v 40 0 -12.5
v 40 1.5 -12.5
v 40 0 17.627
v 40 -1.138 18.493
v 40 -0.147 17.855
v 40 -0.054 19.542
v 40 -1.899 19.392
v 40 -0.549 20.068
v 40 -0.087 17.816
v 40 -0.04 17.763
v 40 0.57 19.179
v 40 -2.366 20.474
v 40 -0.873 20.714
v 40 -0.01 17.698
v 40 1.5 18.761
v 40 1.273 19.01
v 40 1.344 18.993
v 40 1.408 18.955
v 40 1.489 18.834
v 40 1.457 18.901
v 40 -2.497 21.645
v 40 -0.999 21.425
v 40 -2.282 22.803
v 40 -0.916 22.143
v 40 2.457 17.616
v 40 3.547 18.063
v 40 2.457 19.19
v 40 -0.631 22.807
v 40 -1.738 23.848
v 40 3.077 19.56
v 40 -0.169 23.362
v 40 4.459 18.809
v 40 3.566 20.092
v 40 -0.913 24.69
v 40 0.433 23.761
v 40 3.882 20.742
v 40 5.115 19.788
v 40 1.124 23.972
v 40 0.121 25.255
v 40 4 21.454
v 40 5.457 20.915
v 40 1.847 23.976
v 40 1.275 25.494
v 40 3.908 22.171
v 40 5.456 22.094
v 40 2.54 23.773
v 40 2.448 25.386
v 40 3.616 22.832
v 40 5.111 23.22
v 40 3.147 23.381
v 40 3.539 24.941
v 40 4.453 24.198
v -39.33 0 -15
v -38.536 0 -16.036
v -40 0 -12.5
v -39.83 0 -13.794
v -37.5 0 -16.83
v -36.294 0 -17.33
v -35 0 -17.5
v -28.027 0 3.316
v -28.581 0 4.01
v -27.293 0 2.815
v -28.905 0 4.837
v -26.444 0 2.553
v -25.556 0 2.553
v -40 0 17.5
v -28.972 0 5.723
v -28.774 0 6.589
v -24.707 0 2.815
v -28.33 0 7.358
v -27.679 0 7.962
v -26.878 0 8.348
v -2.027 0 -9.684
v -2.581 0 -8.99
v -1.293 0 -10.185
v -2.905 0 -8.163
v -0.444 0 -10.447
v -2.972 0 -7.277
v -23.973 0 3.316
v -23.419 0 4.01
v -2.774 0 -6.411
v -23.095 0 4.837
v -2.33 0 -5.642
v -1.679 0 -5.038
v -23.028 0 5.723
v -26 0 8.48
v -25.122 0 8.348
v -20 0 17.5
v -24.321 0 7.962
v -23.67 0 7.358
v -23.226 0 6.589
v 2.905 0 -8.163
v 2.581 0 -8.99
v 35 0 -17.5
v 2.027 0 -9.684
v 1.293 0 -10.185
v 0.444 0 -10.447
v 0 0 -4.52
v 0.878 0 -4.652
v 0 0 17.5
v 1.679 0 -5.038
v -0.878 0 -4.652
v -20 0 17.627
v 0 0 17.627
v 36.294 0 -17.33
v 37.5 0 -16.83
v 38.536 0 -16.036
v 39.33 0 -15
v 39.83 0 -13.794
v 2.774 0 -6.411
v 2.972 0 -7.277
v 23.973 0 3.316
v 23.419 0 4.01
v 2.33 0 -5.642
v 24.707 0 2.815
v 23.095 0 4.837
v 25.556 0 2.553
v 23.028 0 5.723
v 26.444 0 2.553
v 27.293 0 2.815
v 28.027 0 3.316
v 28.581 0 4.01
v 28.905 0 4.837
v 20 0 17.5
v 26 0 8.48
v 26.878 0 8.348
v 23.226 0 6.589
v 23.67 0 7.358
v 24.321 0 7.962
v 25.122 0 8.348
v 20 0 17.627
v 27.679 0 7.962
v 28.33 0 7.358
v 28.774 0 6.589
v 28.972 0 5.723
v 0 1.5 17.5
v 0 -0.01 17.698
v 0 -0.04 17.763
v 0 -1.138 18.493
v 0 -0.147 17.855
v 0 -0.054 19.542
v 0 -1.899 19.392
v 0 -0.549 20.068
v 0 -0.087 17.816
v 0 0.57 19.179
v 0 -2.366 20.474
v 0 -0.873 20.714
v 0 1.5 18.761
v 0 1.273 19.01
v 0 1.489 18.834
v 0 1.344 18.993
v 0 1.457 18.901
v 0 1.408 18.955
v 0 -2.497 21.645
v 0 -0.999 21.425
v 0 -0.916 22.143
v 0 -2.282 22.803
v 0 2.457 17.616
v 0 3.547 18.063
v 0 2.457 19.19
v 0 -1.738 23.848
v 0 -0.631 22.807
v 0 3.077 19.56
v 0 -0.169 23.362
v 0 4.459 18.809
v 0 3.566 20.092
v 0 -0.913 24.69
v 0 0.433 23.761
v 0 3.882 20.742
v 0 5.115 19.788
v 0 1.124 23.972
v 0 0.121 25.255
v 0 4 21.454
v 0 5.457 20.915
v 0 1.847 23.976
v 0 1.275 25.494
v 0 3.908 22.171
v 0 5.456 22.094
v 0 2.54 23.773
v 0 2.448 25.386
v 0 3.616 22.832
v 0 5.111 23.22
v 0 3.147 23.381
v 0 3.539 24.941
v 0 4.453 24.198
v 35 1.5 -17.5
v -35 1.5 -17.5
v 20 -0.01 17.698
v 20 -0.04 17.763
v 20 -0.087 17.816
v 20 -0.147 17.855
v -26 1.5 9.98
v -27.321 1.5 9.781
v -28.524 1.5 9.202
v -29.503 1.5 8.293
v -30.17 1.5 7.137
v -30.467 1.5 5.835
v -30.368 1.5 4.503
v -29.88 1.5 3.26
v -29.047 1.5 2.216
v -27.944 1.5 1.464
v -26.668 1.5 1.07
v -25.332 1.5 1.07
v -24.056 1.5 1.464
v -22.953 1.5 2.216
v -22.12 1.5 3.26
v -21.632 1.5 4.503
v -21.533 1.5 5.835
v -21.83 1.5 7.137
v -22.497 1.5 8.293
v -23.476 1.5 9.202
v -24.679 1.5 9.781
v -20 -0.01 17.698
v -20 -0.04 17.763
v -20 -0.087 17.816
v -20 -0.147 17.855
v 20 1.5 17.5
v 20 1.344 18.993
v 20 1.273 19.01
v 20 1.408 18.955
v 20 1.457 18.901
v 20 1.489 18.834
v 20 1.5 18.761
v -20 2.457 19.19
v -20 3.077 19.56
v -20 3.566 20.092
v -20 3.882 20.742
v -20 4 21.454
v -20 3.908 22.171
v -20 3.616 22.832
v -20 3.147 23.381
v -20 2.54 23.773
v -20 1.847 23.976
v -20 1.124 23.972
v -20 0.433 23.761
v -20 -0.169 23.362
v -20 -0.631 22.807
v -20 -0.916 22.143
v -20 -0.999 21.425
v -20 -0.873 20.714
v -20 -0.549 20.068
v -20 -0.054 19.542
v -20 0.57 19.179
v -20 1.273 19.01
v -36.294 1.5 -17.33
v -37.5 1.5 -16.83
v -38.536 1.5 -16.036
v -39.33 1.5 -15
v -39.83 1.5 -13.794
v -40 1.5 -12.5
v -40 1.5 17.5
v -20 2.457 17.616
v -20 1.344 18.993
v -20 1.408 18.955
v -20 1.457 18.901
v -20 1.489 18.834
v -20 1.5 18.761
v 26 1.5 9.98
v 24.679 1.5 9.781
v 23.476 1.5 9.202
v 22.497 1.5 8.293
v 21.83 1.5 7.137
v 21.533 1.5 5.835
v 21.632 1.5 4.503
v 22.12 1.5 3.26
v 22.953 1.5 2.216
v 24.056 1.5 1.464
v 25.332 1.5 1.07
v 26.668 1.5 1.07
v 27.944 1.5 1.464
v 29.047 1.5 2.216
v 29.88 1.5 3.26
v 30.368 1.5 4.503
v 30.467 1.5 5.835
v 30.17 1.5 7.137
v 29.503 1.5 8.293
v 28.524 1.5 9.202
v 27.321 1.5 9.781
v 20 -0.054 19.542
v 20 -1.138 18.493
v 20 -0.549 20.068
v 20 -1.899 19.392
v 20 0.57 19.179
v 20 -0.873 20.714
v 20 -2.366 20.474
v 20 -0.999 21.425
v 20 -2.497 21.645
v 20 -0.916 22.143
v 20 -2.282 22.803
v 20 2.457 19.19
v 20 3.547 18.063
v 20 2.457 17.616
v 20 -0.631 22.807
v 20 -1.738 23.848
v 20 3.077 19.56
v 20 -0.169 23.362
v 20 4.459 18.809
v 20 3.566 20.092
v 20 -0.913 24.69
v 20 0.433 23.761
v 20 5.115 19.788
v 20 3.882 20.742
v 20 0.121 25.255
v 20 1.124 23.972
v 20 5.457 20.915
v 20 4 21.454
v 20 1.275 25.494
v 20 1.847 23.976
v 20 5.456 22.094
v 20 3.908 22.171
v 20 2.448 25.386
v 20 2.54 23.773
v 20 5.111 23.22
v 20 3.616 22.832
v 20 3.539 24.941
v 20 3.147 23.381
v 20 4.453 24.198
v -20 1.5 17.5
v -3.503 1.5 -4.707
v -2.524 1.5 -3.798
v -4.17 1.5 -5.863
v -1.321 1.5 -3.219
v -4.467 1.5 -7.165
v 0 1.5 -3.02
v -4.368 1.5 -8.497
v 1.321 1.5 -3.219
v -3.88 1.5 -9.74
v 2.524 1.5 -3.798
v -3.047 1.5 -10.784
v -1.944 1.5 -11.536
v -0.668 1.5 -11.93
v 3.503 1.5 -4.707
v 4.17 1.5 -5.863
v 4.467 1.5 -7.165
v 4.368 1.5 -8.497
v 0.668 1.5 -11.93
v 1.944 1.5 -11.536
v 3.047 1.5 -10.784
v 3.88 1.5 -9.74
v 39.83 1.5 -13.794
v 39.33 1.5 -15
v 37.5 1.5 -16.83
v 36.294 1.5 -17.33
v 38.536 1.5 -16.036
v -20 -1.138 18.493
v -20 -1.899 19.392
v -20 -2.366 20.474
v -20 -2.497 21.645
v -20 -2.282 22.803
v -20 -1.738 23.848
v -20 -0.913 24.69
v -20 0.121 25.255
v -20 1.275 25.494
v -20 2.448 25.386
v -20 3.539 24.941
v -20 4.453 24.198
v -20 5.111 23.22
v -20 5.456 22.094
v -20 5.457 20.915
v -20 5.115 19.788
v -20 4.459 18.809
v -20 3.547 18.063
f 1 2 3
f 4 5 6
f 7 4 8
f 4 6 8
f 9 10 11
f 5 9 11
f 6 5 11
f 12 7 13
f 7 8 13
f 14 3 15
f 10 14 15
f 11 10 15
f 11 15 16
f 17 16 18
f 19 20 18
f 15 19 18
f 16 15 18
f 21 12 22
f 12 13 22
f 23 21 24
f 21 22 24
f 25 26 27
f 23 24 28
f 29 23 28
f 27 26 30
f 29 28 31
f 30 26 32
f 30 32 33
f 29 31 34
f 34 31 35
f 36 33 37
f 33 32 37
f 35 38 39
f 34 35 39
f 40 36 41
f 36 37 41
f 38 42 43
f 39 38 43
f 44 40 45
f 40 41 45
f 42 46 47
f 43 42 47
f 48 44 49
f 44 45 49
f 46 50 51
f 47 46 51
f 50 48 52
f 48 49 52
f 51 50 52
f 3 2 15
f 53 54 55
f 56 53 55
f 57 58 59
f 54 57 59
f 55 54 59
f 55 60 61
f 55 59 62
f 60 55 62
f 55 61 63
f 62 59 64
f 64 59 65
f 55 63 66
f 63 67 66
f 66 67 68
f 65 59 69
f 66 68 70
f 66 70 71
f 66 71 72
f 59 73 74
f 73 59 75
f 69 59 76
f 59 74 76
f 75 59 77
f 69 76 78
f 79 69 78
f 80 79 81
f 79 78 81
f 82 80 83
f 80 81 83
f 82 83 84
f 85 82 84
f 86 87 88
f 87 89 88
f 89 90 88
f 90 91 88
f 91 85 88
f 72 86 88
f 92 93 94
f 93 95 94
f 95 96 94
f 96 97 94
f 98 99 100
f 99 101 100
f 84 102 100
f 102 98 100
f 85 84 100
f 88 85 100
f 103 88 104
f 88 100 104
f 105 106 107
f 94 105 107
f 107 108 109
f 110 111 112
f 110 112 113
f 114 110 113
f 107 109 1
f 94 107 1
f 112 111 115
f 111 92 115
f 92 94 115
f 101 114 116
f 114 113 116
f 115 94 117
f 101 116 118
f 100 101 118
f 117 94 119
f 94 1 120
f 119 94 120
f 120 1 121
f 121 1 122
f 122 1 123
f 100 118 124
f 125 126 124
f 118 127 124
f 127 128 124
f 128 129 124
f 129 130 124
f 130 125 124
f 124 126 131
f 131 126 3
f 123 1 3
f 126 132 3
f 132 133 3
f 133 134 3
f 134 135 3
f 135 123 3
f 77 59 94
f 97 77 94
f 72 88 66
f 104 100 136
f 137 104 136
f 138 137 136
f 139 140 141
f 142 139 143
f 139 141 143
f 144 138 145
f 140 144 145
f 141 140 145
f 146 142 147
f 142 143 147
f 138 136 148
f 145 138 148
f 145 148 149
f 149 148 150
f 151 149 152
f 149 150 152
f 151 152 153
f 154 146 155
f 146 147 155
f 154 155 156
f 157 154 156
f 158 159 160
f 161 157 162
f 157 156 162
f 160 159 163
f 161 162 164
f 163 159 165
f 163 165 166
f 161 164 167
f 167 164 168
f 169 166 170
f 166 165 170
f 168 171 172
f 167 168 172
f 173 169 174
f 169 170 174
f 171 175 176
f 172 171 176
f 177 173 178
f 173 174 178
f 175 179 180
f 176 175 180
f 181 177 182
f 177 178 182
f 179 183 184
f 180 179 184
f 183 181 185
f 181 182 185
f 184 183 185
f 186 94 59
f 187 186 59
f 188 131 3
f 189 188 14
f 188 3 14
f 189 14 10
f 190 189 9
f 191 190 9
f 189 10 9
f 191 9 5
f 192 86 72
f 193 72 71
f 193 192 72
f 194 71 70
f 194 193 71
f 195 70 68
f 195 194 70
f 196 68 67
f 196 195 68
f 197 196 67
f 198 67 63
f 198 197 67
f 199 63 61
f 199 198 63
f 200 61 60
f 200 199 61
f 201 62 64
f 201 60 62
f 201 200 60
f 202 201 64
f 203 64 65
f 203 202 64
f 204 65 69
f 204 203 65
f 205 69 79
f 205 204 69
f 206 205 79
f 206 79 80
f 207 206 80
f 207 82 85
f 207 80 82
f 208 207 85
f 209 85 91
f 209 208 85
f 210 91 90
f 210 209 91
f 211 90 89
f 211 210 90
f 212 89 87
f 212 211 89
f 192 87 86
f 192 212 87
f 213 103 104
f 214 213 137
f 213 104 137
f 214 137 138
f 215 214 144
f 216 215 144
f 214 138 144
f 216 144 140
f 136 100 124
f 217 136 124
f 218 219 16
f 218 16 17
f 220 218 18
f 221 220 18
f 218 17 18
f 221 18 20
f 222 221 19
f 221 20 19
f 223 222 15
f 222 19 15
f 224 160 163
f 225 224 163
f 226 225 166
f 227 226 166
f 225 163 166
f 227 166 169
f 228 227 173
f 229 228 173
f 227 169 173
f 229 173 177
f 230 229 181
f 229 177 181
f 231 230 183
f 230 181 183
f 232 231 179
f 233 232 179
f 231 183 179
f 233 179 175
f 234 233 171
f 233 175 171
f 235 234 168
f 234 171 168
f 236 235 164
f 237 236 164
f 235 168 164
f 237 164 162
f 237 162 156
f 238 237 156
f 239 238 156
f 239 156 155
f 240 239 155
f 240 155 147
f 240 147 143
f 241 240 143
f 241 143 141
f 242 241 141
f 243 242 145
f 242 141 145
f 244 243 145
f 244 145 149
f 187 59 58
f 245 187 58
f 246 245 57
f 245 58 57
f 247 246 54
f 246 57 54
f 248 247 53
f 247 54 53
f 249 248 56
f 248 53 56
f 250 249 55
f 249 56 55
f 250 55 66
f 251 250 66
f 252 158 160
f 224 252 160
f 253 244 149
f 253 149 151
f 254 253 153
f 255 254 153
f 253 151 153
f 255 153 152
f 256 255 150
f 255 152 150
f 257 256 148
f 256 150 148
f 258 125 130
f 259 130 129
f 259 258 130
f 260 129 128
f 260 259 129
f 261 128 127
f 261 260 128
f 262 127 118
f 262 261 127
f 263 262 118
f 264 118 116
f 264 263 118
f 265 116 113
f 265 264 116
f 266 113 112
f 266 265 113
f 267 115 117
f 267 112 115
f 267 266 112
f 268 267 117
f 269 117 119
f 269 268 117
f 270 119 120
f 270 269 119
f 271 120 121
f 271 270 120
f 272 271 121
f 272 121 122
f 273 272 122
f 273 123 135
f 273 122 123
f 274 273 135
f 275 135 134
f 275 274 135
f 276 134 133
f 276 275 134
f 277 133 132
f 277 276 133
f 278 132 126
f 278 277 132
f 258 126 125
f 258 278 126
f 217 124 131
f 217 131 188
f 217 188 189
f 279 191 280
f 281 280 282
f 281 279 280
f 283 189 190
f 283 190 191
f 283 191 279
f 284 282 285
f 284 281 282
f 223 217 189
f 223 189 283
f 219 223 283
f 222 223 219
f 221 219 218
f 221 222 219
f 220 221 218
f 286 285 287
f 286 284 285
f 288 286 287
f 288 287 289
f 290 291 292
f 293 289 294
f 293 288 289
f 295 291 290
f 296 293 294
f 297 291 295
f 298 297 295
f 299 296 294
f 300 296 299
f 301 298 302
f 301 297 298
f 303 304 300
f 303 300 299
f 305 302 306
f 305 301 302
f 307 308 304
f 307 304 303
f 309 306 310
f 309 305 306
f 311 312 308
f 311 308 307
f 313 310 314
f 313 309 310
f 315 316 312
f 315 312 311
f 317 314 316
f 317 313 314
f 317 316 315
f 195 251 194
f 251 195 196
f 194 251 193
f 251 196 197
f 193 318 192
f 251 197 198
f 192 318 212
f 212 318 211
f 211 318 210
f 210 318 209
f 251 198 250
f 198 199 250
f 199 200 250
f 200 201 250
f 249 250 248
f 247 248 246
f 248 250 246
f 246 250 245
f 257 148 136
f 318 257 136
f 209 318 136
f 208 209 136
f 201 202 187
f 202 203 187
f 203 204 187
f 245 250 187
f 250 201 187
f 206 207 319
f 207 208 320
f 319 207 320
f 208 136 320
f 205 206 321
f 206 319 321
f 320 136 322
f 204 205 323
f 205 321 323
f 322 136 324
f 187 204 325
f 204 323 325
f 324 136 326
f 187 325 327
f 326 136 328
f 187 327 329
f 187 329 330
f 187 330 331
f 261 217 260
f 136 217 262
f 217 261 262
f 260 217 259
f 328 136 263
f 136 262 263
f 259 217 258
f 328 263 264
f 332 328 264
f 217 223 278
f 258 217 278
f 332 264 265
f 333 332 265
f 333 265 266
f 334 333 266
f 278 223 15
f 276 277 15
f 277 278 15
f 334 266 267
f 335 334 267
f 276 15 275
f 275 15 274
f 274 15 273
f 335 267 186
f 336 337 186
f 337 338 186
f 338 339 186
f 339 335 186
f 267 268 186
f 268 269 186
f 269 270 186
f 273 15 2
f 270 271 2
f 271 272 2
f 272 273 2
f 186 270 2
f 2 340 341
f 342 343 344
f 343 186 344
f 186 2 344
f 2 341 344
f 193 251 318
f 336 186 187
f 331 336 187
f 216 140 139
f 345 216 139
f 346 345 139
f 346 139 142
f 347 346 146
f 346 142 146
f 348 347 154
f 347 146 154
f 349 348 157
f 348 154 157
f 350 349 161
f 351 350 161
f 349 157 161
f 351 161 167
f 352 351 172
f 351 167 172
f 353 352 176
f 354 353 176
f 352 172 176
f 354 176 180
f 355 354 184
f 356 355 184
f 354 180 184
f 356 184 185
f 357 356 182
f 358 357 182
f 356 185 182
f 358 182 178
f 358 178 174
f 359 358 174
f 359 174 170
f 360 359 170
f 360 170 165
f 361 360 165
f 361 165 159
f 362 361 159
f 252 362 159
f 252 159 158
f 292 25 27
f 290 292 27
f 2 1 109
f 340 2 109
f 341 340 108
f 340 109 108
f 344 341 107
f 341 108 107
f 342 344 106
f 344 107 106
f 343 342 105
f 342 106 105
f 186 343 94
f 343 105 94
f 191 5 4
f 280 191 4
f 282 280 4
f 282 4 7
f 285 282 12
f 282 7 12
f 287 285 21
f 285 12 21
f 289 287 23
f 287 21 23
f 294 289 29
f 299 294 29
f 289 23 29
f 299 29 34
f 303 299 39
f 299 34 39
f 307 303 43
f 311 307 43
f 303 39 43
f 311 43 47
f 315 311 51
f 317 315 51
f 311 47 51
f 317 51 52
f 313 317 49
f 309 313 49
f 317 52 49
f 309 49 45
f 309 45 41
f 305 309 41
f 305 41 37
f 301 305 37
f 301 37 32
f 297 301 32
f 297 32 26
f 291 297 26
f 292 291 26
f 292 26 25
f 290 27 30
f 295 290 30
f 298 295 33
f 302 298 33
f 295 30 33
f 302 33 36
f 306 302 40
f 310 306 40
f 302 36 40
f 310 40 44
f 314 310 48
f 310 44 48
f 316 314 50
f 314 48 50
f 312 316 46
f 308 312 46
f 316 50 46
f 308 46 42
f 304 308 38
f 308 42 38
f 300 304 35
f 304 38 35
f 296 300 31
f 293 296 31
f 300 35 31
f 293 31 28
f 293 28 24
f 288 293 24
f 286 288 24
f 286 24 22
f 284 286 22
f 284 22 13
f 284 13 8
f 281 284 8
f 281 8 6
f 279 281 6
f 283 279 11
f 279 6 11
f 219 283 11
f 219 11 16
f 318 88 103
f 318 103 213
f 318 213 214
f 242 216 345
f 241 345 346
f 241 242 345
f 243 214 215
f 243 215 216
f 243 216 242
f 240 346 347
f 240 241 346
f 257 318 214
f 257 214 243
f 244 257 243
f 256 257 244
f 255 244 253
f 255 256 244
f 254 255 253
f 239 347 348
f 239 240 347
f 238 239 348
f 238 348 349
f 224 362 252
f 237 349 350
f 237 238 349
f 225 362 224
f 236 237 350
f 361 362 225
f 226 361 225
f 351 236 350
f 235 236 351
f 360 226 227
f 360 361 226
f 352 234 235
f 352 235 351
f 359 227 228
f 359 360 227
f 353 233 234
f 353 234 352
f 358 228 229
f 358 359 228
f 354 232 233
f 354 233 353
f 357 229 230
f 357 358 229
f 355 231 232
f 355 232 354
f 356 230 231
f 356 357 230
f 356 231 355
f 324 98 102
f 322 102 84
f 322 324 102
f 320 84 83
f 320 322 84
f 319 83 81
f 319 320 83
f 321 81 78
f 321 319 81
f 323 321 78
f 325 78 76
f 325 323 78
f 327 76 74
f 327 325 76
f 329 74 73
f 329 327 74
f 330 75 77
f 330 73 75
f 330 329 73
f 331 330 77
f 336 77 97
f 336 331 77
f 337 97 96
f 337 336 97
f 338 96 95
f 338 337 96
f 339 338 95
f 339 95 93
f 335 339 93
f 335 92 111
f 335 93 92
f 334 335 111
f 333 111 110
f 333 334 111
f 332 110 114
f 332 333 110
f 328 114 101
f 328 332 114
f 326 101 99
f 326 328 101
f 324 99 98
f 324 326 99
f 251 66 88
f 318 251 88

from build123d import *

# Parameters (mm, degrees)
BOSS_EXTRUDE1_DEPTH          = 1.5
BOSS_EXTRUDE2_DEPTH          = 20
LPATTERN1_COUNT              = 2
LPATTERN1_PITCH              = 40
CSK_FOR_M4_SFHCS1_AT_2_COUNT = 2
CSK_FOR_M4_SFHCS1_AT_2_PITCH = 29.068883707
CSK_FOR_M4_SFHCS1_AT_3_COUNT = 2
CSK_FOR_M4_SFHCS1_AT_3_PITCH = 52


with BuildPart() as part:
    # Sketch1 → Boss-Extrude1 (new body)
    with BuildSketch(Plane(origin=(0, 0, 0), x_dir=(1, 0, 0), z_dir=(0, 1, 0))):
        with BuildLine():
            Line((-40, -17.5), (40, -17.5))
            Line((40, -17.5), (40, 12.5))
            ThreePointArc((40, 12.5), (38.535533906, 16.035533906), (35, 17.5))
            Line((35, 17.5), (-35, 17.5))
            ThreePointArc((-35, 17.5), (-38.535533906, 16.035533906), (-40, 12.5))
            Line((-40, 12.5), (-40, -17.5))
        make_face()
    extrude(amount=BOSS_EXTRUDE1_DEPTH)

    # Sketch2 → Boss-Extrude2 (add)
    with BuildSketch(Plane(origin=(40, 0, 0), x_dir=(0, 0, -1), z_dir=(1, 0, 0))):
        with BuildLine():
            Line((-17.616081812, 2.45665015), (-19.190276967, 2.45665015))
            ThreePointArc((-19.190276967, 2.45665015), (-23.971620702, 1.124379043), (-19.010352011, 1.272727273))
            ThreePointArc((-19.010352011, 1.272727273), (-18.929937178, 1.434637236), (-18.761387212, 1.5))
            Line((-18.761387212, 1.5), (-17.5, 1.5))
            Line((-17.5, 1.5), (-17.5, 0))
            Line((-17.5, 0), (-17.627016654, 0))
            ThreePointArc((-17.627016654, 0), (-17.76259819, -0.039957987), (-17.854839204, -0.147058824))
            ThreePointArc((-17.854839204, -0.147058824), (-25.483287925, 1.865263339), (-17.616081812, 2.45665015))
        make_face()
    boss_extrude2 = extrude(amount=-BOSS_EXTRUDE2_DEPTH)

    # LPattern1: Boss-Extrude2 ×2
    with Locations(*[(-i * LPATTERN1_PITCH, 0, 0) for i in range(1, LPATTERN1_COUNT)]):
        add(boss_extrude2)

    # Sketch5 → CSK for M4 SFHCS1 (revolve, cut)
    with BuildSketch(Plane(origin=(-26, 1.5, 5.5), x_dir=(0, 0, 1), z_dir=(1, 0, 0))):
        Polygon((0, 0), (0, 4), (2.25, 4), (2.25, 2.23), (4.48, 0), align=None)
    csk_for_m4_sfhcs1 = revolve(axis=Axis((-26, 7.85, 5.5), (0, -1, 0)), mode=Mode.SUBTRACT)

    # CSK for M4 SFHCS1 at 2: CSK for M4 SFHCS1 ×2
    with Locations(*[Vector(0.894427190999916, 0, -0.44721359549995787) * (i * CSK_FOR_M4_SFHCS1_AT_2_PITCH) for i in range(1, CSK_FOR_M4_SFHCS1_AT_2_COUNT)]):
        add(csk_for_m4_sfhcs1, mode=Mode.SUBTRACT)

    # CSK for M4 SFHCS1 at 3: CSK for M4 SFHCS1 ×2
    with Locations(*[(i * CSK_FOR_M4_SFHCS1_AT_3_PITCH, 0, 0) for i in range(1, CSK_FOR_M4_SFHCS1_AT_3_COUNT)]):
        add(csk_for_m4_sfhcs1, mode=Mode.SUBTRACT)


solid = part.part
